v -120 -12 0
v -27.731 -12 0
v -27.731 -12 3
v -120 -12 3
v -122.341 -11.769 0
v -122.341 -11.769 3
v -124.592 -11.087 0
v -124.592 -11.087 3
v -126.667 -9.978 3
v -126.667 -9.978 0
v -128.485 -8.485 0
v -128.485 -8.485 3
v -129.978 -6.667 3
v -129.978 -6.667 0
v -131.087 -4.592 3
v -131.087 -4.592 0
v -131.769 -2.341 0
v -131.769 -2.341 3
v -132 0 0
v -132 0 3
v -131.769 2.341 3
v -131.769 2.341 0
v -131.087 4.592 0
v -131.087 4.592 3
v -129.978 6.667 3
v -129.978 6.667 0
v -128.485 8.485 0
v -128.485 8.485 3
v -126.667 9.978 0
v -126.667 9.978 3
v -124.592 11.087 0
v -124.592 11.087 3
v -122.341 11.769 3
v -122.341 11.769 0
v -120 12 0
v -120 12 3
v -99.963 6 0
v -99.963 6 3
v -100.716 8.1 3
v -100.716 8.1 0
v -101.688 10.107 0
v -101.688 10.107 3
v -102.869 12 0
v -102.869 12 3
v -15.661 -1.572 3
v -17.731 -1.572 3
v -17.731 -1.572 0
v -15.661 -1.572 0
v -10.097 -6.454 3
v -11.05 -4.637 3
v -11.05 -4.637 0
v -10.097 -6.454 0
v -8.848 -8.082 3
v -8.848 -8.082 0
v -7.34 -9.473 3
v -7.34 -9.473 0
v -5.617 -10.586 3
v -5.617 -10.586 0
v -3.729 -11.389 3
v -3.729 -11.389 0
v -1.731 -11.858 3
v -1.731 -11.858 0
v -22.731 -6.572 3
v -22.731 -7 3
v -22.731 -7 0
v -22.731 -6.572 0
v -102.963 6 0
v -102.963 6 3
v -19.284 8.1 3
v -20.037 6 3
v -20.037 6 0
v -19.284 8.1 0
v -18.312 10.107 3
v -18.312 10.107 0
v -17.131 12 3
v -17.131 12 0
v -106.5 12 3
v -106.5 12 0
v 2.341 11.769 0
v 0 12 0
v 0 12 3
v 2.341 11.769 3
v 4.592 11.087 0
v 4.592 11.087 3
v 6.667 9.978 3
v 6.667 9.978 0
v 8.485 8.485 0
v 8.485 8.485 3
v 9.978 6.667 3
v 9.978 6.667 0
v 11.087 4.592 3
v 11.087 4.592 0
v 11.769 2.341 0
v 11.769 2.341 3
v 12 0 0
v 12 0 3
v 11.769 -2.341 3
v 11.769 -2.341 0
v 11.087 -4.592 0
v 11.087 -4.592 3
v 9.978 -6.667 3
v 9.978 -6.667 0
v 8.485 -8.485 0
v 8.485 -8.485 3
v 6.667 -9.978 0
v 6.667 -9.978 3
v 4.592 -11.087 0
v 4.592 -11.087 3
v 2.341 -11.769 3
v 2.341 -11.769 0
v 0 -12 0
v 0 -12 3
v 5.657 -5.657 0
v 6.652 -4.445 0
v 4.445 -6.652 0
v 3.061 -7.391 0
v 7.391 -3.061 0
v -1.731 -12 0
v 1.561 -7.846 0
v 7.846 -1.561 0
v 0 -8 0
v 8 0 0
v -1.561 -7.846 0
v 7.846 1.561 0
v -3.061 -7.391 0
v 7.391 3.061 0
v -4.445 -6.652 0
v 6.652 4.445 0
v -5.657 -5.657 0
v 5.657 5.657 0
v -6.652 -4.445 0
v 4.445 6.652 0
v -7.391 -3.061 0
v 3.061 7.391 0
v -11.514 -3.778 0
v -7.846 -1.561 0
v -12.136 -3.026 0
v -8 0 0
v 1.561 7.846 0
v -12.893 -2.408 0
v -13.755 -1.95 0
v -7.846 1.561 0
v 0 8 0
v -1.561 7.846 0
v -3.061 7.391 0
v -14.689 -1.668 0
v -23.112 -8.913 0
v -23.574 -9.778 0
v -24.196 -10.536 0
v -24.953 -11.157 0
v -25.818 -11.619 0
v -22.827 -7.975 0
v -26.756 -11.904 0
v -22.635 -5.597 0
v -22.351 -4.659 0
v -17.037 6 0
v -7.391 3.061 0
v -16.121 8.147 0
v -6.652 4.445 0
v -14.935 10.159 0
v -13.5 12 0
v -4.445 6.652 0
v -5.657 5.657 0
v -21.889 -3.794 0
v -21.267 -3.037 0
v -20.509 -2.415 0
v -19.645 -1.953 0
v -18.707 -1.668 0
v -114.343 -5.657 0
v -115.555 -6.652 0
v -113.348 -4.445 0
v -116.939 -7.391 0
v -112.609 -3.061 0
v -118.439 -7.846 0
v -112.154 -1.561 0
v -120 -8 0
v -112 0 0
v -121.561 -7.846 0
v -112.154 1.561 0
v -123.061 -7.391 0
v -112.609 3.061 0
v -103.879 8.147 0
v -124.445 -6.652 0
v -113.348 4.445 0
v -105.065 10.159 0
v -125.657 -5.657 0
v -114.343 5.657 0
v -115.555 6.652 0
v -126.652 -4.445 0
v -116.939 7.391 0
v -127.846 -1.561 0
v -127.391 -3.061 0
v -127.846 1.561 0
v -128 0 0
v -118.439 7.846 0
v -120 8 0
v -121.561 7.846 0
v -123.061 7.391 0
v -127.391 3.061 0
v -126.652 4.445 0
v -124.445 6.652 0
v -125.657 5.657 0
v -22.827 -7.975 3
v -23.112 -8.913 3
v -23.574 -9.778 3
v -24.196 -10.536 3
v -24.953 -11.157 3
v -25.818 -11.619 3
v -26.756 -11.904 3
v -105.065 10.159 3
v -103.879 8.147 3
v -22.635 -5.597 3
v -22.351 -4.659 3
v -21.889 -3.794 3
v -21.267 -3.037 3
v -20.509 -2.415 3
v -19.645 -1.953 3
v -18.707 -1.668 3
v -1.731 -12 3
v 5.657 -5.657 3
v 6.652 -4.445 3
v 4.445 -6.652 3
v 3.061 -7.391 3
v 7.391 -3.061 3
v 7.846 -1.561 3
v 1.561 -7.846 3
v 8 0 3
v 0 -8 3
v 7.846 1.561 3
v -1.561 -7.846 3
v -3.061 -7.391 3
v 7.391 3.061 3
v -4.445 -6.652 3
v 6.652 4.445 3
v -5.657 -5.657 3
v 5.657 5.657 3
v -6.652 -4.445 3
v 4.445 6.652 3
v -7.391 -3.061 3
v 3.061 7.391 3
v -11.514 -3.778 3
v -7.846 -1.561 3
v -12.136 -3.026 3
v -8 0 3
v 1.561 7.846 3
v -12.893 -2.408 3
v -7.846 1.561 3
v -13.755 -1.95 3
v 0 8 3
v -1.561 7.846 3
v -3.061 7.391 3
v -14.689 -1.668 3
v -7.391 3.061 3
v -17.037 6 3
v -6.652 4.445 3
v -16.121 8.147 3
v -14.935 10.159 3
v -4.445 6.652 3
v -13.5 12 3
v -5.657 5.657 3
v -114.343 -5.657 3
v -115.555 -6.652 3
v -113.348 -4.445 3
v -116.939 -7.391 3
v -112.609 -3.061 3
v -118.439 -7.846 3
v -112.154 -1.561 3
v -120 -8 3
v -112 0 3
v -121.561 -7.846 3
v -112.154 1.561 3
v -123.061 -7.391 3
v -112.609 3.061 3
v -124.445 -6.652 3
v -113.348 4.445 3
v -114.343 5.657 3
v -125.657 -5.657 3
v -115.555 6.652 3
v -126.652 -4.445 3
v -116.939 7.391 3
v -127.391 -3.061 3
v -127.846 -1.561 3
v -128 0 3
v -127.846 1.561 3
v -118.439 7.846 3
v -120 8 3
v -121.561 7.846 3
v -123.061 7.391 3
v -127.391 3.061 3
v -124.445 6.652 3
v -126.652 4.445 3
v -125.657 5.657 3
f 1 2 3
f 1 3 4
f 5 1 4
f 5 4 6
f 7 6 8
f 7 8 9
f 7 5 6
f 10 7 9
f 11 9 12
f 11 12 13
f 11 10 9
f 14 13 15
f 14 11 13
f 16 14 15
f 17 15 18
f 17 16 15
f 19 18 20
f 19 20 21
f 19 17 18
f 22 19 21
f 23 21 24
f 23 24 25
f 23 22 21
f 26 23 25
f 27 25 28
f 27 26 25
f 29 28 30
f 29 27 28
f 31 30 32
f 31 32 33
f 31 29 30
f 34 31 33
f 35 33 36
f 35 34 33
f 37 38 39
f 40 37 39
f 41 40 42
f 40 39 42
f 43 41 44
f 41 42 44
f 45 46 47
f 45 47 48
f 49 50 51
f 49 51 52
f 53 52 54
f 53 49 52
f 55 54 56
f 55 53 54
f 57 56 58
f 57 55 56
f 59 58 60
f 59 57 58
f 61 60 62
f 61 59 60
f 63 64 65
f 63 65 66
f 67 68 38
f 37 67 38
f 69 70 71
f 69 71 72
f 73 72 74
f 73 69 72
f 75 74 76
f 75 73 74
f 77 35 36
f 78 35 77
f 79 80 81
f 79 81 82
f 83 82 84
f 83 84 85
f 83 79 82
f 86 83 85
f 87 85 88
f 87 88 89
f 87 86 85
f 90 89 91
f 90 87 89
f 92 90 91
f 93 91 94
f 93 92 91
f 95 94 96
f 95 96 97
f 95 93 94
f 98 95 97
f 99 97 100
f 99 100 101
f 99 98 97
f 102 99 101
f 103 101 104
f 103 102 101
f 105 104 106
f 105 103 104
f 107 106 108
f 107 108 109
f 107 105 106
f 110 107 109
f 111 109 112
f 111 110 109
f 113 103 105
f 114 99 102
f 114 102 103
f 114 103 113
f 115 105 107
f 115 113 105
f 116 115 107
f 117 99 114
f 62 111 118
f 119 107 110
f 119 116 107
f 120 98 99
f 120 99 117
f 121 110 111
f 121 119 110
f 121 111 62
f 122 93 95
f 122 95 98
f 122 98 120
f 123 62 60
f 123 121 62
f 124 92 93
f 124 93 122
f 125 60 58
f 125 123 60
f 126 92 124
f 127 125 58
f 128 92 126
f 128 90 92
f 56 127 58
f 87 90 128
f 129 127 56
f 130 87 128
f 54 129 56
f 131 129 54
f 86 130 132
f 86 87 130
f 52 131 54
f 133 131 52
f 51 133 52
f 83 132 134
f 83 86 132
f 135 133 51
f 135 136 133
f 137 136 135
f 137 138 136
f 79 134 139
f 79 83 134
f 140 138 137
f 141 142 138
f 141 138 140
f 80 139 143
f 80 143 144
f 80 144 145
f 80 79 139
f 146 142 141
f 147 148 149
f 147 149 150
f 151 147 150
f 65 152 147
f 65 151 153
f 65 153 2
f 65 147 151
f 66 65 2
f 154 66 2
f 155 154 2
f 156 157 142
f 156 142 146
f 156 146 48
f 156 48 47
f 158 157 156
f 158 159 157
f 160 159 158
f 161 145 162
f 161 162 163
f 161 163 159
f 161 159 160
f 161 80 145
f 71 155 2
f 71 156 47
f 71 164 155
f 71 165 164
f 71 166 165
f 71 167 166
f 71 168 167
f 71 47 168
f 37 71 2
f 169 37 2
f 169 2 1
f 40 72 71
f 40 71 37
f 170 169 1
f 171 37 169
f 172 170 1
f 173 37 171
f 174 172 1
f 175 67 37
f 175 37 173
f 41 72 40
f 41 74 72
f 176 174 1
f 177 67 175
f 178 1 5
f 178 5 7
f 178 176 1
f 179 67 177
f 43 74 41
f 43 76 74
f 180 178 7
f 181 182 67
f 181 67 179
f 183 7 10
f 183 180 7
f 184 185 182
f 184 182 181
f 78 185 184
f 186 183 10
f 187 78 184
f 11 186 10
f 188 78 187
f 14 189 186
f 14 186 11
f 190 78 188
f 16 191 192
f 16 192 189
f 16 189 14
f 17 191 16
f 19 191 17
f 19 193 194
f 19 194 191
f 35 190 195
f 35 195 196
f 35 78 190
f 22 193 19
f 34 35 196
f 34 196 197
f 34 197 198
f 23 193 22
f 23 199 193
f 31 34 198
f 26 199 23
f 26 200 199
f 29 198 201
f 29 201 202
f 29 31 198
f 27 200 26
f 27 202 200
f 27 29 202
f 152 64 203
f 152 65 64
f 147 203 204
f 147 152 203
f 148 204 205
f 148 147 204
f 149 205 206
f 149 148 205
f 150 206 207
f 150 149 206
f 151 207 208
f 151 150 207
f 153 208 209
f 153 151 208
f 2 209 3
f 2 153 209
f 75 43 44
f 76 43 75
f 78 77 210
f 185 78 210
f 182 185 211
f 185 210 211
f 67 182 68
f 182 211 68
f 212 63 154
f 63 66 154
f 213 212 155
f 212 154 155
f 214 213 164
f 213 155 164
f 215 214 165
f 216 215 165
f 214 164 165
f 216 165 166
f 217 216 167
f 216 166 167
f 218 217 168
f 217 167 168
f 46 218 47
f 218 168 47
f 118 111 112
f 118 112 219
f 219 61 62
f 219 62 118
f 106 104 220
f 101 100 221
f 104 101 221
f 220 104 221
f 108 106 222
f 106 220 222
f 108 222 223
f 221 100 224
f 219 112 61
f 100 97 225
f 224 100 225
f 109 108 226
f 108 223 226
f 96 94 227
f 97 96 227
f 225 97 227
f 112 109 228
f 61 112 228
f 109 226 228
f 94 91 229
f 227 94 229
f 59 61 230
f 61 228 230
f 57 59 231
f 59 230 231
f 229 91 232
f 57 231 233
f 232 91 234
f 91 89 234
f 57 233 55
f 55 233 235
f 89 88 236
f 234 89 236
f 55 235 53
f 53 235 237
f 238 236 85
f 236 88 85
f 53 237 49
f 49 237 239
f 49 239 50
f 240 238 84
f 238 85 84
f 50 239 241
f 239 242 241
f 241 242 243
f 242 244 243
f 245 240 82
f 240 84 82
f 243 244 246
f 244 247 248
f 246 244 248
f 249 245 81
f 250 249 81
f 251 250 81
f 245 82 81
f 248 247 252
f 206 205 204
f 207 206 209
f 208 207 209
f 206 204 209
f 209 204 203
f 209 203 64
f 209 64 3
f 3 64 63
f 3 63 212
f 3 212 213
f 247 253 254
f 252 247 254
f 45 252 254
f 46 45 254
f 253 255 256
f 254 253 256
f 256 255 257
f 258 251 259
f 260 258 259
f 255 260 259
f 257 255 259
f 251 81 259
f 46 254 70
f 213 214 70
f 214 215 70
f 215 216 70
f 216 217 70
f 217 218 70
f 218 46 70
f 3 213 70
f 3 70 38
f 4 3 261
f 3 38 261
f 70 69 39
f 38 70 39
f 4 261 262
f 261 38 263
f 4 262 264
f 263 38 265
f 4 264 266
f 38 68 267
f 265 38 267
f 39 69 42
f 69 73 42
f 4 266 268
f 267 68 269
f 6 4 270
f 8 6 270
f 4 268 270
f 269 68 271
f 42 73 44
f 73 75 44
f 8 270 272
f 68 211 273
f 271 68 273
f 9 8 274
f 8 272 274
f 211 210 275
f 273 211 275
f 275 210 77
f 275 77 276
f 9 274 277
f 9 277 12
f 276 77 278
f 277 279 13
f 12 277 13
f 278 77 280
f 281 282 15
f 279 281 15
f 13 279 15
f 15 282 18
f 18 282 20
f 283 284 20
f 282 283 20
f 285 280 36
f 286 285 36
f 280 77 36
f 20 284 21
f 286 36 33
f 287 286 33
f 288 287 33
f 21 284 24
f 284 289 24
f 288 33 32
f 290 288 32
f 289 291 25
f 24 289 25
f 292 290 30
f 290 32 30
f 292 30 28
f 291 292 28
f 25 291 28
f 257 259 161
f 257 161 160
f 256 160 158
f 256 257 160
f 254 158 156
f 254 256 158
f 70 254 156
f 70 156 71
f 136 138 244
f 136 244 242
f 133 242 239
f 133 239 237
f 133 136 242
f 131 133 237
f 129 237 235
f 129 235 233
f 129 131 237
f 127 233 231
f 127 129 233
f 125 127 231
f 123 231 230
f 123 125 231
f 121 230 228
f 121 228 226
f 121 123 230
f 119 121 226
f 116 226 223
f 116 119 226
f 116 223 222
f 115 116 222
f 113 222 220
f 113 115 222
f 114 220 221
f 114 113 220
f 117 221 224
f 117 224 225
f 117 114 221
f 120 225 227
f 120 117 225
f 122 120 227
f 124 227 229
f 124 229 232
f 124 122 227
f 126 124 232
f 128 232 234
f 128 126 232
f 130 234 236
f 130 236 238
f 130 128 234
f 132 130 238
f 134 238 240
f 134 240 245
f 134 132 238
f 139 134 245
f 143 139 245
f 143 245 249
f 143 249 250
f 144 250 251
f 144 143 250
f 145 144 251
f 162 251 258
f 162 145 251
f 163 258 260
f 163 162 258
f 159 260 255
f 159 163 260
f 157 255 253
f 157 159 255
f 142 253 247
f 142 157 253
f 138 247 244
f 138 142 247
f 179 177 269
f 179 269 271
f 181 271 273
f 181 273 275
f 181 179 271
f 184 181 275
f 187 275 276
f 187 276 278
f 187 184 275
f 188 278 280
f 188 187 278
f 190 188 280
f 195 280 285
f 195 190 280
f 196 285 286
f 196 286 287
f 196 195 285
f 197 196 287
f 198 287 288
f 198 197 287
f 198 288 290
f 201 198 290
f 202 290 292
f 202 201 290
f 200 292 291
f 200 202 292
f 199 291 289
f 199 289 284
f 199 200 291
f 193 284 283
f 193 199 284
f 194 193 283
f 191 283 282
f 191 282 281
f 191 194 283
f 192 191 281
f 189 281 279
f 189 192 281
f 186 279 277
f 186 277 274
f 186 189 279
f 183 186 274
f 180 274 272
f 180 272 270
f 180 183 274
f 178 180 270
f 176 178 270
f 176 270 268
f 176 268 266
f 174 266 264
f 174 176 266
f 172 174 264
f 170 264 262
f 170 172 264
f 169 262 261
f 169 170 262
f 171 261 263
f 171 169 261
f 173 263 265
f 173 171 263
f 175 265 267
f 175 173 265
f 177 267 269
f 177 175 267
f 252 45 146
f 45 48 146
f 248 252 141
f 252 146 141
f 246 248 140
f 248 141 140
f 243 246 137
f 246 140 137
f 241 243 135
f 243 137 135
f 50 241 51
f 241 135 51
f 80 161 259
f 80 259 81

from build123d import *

# Parameters (mm, degrees)
SKETCH1_R           = 8
BOSS_EXTRUDE1_DEPTH = 3
CUT_EXTRUDE1_DEPTH  = 133.578278764
CUT_EXTRUDE8_DEPTH  = 10
FILLET2_R           = 5
FILLET3_R           = 5
FILLET4_R           = 5


with BuildPart() as part:
    # Sketch1 → Boss-Extrude1 (new body)
    with BuildSketch(Plane.XY):
        with BuildLine():
            Line((0, -12), (-120, -12))
            ThreePointArc((-120, -12), (-132, 0), (-120, 12))
            Line((-120, 12), (0, 12))
            ThreePointArc((0, 12), (12, 0), (0, -12))
        make_face()
        with Locations((-120, 0)):
            Circle(SKETCH1_R, mode=Mode.SUBTRACT)
        with Locations(Location((0, 0, 0), (0, 0, 180))):
            Circle(SKETCH1_R, mode=Mode.SUBTRACT)
    extrude(amount=BOSS_EXTRUDE1_DEPTH)

    # Sketch2 → Cut-Extrude1 (cut, through all)
    with BuildSketch(Plane.XY.offset(3)):
        with BuildLine():
            Line((-17.036725037, 6), (-20.036725037, 6))
            ThreePointArc((-20.036725037, 6), (-18.824439071, 9.116514898), (-17.130976336, 12))
            Line((-17.130976336, 12), (-13.5, 12))
            ThreePointArc((-13.5, 12), (-15.560298648, 9.172082969), (-17.036725037, 6))
        make_face()
        with BuildLine():
            Line((-102.963274963, 6), (-99.963274963, 6))
            ThreePointArc((-99.963274963, 6), (-101.175560929, 9.116514898), (-102.869023664, 12))
            Line((-102.869023664, 12), (-106.5, 12))
            ThreePointArc((-106.5, 12), (-104.439701352, 9.172082969), (-102.963274963, 6))
        make_face()
    extrude(amount=-CUT_EXTRUDE1_DEPTH, mode=Mode.SUBTRACT)

    # Sketch5 → Cut-Extrude8 (cut)
    with BuildSketch(Plane.XY.offset(3)):
        with BuildLine():
            Line((-1.731193523, -11.858337769), (-1.731193523, -12))
            Line((-1.731193523, -12), (-22.731193523, -12))
            Line((-22.731193523, -12), (-22.731193523, -2.344249067))
            Line((-22.731193523, -2.344249067), (-22.731193523, -1.572214532))
            Line((-22.731193523, -1.572214532), (-11.880460729, -1.572214532))
            ThreePointArc((-11.880460729, -1.572214532), (-8.530554828, -8.417056492), (-1.731193523, -11.858337769))
        make_face()
    extrude(amount=-CUT_EXTRUDE8_DEPTH, mode=Mode.SUBTRACT)

    # Fillet2
    fillet2_edges = [part.edges().sort_by_distance(p)[0] for p in [
        (-22.731193523, -1.572214532, 1.5),
    ]]
    fillet(fillet2_edges, radius=FILLET2_R)

    # Fillet3
    fillet3_edges = [part.edges().sort_by_distance(p)[0] for p in [
        (-11.880460729, -1.572214532, 1.5),
    ]]
    fillet(fillet3_edges, radius=FILLET3_R)

    # Fillet4
    fillet4_edges = [part.edges().sort_by_distance(p)[0] for p in [
        (-22.731193523, -12, 1.5),
    ]]
    fillet(fillet4_edges, radius=FILLET4_R)


solid = part.part
